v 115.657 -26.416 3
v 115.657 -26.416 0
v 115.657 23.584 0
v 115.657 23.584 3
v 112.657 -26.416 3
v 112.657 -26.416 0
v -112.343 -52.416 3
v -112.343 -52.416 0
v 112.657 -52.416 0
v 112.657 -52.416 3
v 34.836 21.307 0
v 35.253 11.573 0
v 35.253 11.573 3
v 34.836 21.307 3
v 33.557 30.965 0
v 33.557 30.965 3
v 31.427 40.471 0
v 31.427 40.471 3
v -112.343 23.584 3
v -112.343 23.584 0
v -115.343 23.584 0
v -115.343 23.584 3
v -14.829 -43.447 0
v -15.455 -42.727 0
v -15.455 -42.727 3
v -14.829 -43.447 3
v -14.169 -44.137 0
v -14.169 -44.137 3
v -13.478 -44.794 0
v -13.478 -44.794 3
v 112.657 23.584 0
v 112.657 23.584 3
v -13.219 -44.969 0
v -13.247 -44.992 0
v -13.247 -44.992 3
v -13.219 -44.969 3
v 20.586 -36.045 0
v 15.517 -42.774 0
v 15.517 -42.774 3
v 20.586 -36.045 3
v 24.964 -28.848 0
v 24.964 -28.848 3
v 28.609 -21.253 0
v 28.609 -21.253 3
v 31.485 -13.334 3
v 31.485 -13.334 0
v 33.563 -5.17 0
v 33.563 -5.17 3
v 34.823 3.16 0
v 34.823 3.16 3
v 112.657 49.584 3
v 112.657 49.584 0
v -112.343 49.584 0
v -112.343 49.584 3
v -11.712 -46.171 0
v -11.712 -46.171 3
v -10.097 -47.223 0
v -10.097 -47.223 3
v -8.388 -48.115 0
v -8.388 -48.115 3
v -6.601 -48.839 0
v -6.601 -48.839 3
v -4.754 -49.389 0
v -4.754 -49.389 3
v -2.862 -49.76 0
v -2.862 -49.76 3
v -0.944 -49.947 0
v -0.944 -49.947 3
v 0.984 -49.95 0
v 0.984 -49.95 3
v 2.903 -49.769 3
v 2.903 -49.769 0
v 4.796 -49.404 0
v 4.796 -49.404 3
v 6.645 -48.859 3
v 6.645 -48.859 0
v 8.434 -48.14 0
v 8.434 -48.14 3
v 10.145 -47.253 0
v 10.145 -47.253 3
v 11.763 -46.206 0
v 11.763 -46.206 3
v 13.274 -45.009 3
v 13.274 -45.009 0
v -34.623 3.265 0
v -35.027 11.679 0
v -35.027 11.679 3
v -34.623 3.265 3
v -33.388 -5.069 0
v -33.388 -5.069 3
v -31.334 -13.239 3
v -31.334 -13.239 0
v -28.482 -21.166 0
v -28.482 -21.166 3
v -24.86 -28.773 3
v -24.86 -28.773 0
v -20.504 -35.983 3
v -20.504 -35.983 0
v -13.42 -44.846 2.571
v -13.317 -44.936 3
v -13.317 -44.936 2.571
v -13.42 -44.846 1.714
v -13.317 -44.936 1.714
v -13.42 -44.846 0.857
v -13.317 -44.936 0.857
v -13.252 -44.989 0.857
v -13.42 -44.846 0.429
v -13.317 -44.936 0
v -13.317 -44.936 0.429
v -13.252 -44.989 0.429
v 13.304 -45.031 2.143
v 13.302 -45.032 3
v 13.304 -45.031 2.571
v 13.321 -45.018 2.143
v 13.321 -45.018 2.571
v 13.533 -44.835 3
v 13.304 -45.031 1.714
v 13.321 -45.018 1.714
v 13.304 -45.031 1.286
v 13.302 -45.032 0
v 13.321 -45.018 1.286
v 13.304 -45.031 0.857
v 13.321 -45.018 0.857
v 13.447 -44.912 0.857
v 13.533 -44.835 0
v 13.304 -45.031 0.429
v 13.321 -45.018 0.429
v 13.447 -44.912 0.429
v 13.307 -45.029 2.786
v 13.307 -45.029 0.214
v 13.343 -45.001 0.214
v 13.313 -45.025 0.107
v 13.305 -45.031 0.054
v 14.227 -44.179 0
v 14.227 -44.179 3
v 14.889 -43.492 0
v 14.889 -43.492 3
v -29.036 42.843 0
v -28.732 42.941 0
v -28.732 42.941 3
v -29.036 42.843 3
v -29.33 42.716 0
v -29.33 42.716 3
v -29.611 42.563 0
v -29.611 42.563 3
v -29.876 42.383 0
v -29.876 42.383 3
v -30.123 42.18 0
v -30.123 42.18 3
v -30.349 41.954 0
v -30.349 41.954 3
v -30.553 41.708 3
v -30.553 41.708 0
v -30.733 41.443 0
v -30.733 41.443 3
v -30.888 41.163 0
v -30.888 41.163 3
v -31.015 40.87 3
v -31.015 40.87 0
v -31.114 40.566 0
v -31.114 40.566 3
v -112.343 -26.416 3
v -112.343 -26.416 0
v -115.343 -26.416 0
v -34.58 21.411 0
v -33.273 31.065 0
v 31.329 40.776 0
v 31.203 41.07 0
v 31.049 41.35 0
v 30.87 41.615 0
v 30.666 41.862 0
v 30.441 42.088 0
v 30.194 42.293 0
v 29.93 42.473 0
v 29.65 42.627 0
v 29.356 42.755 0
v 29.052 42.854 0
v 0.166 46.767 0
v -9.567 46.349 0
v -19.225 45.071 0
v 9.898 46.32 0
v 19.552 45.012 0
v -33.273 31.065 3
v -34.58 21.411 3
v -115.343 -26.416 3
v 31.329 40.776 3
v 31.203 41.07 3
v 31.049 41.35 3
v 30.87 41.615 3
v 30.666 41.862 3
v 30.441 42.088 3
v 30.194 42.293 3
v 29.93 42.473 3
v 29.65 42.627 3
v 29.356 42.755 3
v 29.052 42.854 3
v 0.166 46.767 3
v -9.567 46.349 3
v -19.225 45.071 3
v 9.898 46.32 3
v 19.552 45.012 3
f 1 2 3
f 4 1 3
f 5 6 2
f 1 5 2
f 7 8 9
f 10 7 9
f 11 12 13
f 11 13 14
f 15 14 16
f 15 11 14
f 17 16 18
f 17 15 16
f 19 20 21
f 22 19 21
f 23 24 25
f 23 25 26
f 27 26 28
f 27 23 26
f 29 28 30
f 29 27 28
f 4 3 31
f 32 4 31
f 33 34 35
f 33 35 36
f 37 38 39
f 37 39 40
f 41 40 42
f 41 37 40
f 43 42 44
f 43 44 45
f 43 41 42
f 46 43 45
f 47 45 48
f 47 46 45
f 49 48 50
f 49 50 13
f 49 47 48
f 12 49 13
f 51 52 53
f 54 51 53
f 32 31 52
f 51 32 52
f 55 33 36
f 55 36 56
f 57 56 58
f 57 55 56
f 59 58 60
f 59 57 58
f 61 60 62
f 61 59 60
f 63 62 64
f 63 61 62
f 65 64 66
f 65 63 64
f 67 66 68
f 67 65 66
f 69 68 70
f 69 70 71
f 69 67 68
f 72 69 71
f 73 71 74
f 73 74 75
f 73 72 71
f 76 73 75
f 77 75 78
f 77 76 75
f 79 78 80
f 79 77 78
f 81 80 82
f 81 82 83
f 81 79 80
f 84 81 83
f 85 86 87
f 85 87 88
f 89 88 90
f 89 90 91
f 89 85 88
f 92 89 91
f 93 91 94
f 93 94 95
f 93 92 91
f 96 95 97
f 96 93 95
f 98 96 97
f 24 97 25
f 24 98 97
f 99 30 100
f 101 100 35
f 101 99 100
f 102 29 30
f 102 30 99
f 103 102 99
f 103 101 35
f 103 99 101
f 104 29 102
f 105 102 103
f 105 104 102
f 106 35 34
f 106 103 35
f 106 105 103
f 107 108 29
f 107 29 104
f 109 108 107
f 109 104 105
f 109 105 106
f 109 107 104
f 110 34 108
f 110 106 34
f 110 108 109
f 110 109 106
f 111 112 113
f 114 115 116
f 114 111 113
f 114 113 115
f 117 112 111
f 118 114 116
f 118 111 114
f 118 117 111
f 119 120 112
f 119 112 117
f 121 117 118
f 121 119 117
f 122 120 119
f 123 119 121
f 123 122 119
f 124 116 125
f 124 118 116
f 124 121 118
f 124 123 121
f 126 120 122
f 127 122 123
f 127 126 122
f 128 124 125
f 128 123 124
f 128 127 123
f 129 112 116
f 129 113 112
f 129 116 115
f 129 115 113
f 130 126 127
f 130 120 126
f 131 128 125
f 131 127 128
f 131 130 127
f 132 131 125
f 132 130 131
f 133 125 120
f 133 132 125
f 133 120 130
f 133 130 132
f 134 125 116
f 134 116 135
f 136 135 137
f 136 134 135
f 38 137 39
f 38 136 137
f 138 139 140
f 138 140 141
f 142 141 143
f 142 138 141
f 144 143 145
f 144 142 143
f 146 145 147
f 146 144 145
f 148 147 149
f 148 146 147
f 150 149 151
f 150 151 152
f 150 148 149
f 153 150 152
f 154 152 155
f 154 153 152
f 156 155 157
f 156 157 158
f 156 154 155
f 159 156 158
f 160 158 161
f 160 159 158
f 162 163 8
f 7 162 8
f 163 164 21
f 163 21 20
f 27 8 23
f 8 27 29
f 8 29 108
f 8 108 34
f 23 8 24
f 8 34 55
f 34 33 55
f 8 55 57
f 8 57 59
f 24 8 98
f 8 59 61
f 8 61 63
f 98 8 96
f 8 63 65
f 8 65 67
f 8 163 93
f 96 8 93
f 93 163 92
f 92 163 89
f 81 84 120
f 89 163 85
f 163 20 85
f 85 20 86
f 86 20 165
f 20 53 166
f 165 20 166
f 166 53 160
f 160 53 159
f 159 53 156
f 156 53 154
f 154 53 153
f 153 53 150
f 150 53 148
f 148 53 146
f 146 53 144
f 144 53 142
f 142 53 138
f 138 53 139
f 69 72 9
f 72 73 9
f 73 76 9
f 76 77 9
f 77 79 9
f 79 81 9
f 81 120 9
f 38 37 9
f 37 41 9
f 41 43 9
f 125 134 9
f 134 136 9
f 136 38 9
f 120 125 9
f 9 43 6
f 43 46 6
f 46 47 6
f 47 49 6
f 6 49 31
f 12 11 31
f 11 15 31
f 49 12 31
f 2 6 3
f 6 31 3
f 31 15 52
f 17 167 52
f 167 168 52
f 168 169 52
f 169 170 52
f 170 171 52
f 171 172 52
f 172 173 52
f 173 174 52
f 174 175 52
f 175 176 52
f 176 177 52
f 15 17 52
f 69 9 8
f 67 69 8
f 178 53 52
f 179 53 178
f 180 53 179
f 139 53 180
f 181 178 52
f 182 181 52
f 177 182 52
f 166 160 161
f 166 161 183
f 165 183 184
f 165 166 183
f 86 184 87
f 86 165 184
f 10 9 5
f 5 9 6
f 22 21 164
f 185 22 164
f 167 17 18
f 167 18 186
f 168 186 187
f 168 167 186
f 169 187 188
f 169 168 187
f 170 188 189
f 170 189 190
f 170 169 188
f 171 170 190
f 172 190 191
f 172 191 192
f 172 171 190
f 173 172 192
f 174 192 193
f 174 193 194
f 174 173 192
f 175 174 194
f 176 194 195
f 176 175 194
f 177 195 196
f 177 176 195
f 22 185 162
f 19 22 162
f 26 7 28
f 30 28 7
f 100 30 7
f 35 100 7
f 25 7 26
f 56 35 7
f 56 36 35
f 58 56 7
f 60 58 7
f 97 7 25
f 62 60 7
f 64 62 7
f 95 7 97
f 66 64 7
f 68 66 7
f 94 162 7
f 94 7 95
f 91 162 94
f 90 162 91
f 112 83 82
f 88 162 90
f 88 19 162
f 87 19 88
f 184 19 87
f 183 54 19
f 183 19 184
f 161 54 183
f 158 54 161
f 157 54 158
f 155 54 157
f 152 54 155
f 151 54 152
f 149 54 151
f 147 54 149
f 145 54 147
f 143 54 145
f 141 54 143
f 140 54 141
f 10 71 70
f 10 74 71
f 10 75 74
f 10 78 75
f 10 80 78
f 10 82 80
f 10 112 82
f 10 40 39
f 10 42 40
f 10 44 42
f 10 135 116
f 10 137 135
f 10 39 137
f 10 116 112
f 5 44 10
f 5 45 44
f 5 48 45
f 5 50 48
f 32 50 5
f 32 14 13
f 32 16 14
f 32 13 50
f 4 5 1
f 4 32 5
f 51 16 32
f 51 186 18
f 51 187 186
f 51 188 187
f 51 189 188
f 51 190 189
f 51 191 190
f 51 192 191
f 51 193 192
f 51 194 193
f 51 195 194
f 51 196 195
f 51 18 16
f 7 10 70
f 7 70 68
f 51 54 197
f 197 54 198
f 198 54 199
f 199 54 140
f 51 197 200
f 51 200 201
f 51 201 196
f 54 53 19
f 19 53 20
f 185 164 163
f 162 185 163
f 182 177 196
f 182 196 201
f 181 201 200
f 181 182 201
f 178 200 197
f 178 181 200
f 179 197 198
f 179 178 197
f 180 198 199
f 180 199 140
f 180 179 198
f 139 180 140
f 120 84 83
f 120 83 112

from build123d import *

# Parameters (mm, degrees)
BOSS_EXTRUDE1_DEPTH = 3


with BuildPart() as part:
    # Sketch1 → Boss-Extrude1 (new body)
    with BuildSketch(Plane.XY):
        Polygon((-112.34268018, 49.584121622), (-112.34268018, 23.584121622), (-115.34268018, 23.584121622), (-115.34268018, -26.415878378), (-112.34268018, -26.415878378), (-112.34268018, -52.415878378), (112.65731982, -52.415878378), (112.65731982, -26.415878378), (115.65731982, -26.415878378), (115.65731982, 23.584121622), (112.65731982, 23.584121622), (112.65731982, 49.584121622), align=None)
        with BuildLine():
            Line((13.274286272, -45.008836488), (13.301852176, -45.03203797))
            add(Edge.make_bspline(
                [(13.301852176, -45.03203797), (13.302434824, -45.031895887), (13.303594926, -45.031612989), (13.310345597, -45.026788399), (13.327424294, -45.013559601), (13.368373413, -44.979806794), (13.432345907, -44.924692433), (13.489247142, -44.874546261), (13.518732521, -44.84808225), (13.533463875, -44.834860418)],
                knots=[0, 0, 0, 0, 0.083775212, 0.166803477, 0.250583378, 0.499711324, 0.748903893, 0.874548479, 1, 1, 1, 1], degree=3))
            ThreePointArc((13.533463875, -44.834860418), (14.561847159, -43.83964014), (15.516962395, -42.773905432))
            ThreePointArc((15.516962395, -42.773905432), (30.145326147, -17.328936846), (35.253292189, 11.573383741))
            ThreePointArc((35.253292189, 11.573383741), (34.303607008, 26.14987852), (31.427393187, 40.471313366))
            ThreePointArc((31.427393187, 40.471313366), (30.556136604, 41.977838946), (29.052246095, 42.853636122))
            ThreePointArc((29.052246095, 42.853636122), (0.16598909, 46.766690687), (-28.731940535, 42.940791684))
            ThreePointArc((-28.731940535, 42.940791684), (-30.238466115, 42.069535101), (-31.114263292, 40.565644593))
            ThreePointArc((-31.114263292, 40.565644593), (-34.033665807, 26.252951242), (-35.027317855, 11.679387588))
            ThreePointArc((-35.027317855, 11.679387588), (-30.00656127, -17.238210094), (-15.455020905, -42.727190564))
            ThreePointArc((-15.455020905, -42.727190564), (-14.50312489, -43.795801606), (-13.477748449, -44.794119559))
            add(Edge.make_bspline(
                [(-13.477748449, -44.794119559), (-13.467950877, -44.802979196), (-13.448447729, -44.820615282), (-13.419486181, -44.846490582), (-13.372927905, -44.887713721), (-13.313203528, -44.93946889), (-13.269741808, -44.975508675), (-13.250245048, -44.990563249), (-13.247902102, -44.991518213), (-13.246732606, -44.991994889)],
                knots=[0, 0, 0, 0, 0.083817862, 0.166848714, 0.250507589, 0.499664298, 0.748829297, 0.874626478, 1, 1, 1, 1], degree=3))
            Line((-13.246732606, -44.991994889), (-13.219096838, -44.968876668))
            ThreePointArc((-13.219096838, -44.968876668), (0.020078677, -49.971995234), (13.274286272, -45.008836488))
        make_face(mode=Mode.SUBTRACT)
    extrude(amount=BOSS_EXTRUDE1_DEPTH)


solid = part.part
